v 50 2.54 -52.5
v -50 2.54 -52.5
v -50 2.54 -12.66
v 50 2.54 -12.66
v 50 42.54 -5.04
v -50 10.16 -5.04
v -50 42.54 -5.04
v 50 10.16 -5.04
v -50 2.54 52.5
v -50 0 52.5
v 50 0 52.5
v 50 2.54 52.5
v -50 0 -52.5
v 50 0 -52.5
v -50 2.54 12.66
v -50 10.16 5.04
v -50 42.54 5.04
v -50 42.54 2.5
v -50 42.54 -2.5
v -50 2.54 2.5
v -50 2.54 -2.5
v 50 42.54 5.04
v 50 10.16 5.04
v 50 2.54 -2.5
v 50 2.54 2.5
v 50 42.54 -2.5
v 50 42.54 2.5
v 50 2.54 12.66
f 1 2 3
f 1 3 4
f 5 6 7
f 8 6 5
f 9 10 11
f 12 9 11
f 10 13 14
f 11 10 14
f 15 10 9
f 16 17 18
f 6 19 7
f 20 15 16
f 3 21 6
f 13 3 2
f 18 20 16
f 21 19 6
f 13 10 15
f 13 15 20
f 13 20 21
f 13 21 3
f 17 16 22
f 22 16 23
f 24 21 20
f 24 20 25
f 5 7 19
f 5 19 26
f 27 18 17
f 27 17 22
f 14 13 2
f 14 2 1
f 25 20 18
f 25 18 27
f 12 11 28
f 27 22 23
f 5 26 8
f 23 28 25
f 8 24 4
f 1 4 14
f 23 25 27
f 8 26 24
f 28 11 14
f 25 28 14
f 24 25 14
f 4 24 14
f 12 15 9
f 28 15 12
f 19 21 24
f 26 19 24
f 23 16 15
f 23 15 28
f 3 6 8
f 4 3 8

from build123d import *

# Parameters (mm, degrees)
SKETCH1_W           = 100
SKETCH1_H           = 105
BOSS_EXTRUDE1_DEPTH = 2.54
SKETCH2_W           = 100
SKETCH2_H           = 2.54
BOSS_EXTRUDE2_DEPTH = 40
CHAMFER1_SIZE       = 7.62


with BuildPart() as part:
    # Sketch1 → Boss-Extrude1 (new body)
    with BuildSketch(Plane(origin=(0, 0, 0), x_dir=(1, 0, 0), z_dir=(0, 1, 0))):
        Rectangle(SKETCH1_W, SKETCH1_H)
    extrude(amount=BOSS_EXTRUDE1_DEPTH)

    # Sketch2 → Boss-Extrude2 (add)
    with BuildSketch(Plane(origin=(0, 2.54, 0), x_dir=(1, 0, 0), z_dir=(0, 1, 0))):
        with Locations((0, 3.77)):
            Rectangle(SKETCH2_W, SKETCH2_H)
        with Locations((0, -3.77)):
            Rectangle(SKETCH2_W, SKETCH2_H)
    extrude(amount=BOSS_EXTRUDE2_DEPTH)

    # Chamfer1
    chamfer1_edges = [part.edges().sort_by_distance(p)[0] for p in [
        (0, 2.54, -5.04),
        (0, 2.54, 5.04),
    ]]
    chamfer(chamfer1_edges, length=CHAMFER1_SIZE)


solid = part.part
